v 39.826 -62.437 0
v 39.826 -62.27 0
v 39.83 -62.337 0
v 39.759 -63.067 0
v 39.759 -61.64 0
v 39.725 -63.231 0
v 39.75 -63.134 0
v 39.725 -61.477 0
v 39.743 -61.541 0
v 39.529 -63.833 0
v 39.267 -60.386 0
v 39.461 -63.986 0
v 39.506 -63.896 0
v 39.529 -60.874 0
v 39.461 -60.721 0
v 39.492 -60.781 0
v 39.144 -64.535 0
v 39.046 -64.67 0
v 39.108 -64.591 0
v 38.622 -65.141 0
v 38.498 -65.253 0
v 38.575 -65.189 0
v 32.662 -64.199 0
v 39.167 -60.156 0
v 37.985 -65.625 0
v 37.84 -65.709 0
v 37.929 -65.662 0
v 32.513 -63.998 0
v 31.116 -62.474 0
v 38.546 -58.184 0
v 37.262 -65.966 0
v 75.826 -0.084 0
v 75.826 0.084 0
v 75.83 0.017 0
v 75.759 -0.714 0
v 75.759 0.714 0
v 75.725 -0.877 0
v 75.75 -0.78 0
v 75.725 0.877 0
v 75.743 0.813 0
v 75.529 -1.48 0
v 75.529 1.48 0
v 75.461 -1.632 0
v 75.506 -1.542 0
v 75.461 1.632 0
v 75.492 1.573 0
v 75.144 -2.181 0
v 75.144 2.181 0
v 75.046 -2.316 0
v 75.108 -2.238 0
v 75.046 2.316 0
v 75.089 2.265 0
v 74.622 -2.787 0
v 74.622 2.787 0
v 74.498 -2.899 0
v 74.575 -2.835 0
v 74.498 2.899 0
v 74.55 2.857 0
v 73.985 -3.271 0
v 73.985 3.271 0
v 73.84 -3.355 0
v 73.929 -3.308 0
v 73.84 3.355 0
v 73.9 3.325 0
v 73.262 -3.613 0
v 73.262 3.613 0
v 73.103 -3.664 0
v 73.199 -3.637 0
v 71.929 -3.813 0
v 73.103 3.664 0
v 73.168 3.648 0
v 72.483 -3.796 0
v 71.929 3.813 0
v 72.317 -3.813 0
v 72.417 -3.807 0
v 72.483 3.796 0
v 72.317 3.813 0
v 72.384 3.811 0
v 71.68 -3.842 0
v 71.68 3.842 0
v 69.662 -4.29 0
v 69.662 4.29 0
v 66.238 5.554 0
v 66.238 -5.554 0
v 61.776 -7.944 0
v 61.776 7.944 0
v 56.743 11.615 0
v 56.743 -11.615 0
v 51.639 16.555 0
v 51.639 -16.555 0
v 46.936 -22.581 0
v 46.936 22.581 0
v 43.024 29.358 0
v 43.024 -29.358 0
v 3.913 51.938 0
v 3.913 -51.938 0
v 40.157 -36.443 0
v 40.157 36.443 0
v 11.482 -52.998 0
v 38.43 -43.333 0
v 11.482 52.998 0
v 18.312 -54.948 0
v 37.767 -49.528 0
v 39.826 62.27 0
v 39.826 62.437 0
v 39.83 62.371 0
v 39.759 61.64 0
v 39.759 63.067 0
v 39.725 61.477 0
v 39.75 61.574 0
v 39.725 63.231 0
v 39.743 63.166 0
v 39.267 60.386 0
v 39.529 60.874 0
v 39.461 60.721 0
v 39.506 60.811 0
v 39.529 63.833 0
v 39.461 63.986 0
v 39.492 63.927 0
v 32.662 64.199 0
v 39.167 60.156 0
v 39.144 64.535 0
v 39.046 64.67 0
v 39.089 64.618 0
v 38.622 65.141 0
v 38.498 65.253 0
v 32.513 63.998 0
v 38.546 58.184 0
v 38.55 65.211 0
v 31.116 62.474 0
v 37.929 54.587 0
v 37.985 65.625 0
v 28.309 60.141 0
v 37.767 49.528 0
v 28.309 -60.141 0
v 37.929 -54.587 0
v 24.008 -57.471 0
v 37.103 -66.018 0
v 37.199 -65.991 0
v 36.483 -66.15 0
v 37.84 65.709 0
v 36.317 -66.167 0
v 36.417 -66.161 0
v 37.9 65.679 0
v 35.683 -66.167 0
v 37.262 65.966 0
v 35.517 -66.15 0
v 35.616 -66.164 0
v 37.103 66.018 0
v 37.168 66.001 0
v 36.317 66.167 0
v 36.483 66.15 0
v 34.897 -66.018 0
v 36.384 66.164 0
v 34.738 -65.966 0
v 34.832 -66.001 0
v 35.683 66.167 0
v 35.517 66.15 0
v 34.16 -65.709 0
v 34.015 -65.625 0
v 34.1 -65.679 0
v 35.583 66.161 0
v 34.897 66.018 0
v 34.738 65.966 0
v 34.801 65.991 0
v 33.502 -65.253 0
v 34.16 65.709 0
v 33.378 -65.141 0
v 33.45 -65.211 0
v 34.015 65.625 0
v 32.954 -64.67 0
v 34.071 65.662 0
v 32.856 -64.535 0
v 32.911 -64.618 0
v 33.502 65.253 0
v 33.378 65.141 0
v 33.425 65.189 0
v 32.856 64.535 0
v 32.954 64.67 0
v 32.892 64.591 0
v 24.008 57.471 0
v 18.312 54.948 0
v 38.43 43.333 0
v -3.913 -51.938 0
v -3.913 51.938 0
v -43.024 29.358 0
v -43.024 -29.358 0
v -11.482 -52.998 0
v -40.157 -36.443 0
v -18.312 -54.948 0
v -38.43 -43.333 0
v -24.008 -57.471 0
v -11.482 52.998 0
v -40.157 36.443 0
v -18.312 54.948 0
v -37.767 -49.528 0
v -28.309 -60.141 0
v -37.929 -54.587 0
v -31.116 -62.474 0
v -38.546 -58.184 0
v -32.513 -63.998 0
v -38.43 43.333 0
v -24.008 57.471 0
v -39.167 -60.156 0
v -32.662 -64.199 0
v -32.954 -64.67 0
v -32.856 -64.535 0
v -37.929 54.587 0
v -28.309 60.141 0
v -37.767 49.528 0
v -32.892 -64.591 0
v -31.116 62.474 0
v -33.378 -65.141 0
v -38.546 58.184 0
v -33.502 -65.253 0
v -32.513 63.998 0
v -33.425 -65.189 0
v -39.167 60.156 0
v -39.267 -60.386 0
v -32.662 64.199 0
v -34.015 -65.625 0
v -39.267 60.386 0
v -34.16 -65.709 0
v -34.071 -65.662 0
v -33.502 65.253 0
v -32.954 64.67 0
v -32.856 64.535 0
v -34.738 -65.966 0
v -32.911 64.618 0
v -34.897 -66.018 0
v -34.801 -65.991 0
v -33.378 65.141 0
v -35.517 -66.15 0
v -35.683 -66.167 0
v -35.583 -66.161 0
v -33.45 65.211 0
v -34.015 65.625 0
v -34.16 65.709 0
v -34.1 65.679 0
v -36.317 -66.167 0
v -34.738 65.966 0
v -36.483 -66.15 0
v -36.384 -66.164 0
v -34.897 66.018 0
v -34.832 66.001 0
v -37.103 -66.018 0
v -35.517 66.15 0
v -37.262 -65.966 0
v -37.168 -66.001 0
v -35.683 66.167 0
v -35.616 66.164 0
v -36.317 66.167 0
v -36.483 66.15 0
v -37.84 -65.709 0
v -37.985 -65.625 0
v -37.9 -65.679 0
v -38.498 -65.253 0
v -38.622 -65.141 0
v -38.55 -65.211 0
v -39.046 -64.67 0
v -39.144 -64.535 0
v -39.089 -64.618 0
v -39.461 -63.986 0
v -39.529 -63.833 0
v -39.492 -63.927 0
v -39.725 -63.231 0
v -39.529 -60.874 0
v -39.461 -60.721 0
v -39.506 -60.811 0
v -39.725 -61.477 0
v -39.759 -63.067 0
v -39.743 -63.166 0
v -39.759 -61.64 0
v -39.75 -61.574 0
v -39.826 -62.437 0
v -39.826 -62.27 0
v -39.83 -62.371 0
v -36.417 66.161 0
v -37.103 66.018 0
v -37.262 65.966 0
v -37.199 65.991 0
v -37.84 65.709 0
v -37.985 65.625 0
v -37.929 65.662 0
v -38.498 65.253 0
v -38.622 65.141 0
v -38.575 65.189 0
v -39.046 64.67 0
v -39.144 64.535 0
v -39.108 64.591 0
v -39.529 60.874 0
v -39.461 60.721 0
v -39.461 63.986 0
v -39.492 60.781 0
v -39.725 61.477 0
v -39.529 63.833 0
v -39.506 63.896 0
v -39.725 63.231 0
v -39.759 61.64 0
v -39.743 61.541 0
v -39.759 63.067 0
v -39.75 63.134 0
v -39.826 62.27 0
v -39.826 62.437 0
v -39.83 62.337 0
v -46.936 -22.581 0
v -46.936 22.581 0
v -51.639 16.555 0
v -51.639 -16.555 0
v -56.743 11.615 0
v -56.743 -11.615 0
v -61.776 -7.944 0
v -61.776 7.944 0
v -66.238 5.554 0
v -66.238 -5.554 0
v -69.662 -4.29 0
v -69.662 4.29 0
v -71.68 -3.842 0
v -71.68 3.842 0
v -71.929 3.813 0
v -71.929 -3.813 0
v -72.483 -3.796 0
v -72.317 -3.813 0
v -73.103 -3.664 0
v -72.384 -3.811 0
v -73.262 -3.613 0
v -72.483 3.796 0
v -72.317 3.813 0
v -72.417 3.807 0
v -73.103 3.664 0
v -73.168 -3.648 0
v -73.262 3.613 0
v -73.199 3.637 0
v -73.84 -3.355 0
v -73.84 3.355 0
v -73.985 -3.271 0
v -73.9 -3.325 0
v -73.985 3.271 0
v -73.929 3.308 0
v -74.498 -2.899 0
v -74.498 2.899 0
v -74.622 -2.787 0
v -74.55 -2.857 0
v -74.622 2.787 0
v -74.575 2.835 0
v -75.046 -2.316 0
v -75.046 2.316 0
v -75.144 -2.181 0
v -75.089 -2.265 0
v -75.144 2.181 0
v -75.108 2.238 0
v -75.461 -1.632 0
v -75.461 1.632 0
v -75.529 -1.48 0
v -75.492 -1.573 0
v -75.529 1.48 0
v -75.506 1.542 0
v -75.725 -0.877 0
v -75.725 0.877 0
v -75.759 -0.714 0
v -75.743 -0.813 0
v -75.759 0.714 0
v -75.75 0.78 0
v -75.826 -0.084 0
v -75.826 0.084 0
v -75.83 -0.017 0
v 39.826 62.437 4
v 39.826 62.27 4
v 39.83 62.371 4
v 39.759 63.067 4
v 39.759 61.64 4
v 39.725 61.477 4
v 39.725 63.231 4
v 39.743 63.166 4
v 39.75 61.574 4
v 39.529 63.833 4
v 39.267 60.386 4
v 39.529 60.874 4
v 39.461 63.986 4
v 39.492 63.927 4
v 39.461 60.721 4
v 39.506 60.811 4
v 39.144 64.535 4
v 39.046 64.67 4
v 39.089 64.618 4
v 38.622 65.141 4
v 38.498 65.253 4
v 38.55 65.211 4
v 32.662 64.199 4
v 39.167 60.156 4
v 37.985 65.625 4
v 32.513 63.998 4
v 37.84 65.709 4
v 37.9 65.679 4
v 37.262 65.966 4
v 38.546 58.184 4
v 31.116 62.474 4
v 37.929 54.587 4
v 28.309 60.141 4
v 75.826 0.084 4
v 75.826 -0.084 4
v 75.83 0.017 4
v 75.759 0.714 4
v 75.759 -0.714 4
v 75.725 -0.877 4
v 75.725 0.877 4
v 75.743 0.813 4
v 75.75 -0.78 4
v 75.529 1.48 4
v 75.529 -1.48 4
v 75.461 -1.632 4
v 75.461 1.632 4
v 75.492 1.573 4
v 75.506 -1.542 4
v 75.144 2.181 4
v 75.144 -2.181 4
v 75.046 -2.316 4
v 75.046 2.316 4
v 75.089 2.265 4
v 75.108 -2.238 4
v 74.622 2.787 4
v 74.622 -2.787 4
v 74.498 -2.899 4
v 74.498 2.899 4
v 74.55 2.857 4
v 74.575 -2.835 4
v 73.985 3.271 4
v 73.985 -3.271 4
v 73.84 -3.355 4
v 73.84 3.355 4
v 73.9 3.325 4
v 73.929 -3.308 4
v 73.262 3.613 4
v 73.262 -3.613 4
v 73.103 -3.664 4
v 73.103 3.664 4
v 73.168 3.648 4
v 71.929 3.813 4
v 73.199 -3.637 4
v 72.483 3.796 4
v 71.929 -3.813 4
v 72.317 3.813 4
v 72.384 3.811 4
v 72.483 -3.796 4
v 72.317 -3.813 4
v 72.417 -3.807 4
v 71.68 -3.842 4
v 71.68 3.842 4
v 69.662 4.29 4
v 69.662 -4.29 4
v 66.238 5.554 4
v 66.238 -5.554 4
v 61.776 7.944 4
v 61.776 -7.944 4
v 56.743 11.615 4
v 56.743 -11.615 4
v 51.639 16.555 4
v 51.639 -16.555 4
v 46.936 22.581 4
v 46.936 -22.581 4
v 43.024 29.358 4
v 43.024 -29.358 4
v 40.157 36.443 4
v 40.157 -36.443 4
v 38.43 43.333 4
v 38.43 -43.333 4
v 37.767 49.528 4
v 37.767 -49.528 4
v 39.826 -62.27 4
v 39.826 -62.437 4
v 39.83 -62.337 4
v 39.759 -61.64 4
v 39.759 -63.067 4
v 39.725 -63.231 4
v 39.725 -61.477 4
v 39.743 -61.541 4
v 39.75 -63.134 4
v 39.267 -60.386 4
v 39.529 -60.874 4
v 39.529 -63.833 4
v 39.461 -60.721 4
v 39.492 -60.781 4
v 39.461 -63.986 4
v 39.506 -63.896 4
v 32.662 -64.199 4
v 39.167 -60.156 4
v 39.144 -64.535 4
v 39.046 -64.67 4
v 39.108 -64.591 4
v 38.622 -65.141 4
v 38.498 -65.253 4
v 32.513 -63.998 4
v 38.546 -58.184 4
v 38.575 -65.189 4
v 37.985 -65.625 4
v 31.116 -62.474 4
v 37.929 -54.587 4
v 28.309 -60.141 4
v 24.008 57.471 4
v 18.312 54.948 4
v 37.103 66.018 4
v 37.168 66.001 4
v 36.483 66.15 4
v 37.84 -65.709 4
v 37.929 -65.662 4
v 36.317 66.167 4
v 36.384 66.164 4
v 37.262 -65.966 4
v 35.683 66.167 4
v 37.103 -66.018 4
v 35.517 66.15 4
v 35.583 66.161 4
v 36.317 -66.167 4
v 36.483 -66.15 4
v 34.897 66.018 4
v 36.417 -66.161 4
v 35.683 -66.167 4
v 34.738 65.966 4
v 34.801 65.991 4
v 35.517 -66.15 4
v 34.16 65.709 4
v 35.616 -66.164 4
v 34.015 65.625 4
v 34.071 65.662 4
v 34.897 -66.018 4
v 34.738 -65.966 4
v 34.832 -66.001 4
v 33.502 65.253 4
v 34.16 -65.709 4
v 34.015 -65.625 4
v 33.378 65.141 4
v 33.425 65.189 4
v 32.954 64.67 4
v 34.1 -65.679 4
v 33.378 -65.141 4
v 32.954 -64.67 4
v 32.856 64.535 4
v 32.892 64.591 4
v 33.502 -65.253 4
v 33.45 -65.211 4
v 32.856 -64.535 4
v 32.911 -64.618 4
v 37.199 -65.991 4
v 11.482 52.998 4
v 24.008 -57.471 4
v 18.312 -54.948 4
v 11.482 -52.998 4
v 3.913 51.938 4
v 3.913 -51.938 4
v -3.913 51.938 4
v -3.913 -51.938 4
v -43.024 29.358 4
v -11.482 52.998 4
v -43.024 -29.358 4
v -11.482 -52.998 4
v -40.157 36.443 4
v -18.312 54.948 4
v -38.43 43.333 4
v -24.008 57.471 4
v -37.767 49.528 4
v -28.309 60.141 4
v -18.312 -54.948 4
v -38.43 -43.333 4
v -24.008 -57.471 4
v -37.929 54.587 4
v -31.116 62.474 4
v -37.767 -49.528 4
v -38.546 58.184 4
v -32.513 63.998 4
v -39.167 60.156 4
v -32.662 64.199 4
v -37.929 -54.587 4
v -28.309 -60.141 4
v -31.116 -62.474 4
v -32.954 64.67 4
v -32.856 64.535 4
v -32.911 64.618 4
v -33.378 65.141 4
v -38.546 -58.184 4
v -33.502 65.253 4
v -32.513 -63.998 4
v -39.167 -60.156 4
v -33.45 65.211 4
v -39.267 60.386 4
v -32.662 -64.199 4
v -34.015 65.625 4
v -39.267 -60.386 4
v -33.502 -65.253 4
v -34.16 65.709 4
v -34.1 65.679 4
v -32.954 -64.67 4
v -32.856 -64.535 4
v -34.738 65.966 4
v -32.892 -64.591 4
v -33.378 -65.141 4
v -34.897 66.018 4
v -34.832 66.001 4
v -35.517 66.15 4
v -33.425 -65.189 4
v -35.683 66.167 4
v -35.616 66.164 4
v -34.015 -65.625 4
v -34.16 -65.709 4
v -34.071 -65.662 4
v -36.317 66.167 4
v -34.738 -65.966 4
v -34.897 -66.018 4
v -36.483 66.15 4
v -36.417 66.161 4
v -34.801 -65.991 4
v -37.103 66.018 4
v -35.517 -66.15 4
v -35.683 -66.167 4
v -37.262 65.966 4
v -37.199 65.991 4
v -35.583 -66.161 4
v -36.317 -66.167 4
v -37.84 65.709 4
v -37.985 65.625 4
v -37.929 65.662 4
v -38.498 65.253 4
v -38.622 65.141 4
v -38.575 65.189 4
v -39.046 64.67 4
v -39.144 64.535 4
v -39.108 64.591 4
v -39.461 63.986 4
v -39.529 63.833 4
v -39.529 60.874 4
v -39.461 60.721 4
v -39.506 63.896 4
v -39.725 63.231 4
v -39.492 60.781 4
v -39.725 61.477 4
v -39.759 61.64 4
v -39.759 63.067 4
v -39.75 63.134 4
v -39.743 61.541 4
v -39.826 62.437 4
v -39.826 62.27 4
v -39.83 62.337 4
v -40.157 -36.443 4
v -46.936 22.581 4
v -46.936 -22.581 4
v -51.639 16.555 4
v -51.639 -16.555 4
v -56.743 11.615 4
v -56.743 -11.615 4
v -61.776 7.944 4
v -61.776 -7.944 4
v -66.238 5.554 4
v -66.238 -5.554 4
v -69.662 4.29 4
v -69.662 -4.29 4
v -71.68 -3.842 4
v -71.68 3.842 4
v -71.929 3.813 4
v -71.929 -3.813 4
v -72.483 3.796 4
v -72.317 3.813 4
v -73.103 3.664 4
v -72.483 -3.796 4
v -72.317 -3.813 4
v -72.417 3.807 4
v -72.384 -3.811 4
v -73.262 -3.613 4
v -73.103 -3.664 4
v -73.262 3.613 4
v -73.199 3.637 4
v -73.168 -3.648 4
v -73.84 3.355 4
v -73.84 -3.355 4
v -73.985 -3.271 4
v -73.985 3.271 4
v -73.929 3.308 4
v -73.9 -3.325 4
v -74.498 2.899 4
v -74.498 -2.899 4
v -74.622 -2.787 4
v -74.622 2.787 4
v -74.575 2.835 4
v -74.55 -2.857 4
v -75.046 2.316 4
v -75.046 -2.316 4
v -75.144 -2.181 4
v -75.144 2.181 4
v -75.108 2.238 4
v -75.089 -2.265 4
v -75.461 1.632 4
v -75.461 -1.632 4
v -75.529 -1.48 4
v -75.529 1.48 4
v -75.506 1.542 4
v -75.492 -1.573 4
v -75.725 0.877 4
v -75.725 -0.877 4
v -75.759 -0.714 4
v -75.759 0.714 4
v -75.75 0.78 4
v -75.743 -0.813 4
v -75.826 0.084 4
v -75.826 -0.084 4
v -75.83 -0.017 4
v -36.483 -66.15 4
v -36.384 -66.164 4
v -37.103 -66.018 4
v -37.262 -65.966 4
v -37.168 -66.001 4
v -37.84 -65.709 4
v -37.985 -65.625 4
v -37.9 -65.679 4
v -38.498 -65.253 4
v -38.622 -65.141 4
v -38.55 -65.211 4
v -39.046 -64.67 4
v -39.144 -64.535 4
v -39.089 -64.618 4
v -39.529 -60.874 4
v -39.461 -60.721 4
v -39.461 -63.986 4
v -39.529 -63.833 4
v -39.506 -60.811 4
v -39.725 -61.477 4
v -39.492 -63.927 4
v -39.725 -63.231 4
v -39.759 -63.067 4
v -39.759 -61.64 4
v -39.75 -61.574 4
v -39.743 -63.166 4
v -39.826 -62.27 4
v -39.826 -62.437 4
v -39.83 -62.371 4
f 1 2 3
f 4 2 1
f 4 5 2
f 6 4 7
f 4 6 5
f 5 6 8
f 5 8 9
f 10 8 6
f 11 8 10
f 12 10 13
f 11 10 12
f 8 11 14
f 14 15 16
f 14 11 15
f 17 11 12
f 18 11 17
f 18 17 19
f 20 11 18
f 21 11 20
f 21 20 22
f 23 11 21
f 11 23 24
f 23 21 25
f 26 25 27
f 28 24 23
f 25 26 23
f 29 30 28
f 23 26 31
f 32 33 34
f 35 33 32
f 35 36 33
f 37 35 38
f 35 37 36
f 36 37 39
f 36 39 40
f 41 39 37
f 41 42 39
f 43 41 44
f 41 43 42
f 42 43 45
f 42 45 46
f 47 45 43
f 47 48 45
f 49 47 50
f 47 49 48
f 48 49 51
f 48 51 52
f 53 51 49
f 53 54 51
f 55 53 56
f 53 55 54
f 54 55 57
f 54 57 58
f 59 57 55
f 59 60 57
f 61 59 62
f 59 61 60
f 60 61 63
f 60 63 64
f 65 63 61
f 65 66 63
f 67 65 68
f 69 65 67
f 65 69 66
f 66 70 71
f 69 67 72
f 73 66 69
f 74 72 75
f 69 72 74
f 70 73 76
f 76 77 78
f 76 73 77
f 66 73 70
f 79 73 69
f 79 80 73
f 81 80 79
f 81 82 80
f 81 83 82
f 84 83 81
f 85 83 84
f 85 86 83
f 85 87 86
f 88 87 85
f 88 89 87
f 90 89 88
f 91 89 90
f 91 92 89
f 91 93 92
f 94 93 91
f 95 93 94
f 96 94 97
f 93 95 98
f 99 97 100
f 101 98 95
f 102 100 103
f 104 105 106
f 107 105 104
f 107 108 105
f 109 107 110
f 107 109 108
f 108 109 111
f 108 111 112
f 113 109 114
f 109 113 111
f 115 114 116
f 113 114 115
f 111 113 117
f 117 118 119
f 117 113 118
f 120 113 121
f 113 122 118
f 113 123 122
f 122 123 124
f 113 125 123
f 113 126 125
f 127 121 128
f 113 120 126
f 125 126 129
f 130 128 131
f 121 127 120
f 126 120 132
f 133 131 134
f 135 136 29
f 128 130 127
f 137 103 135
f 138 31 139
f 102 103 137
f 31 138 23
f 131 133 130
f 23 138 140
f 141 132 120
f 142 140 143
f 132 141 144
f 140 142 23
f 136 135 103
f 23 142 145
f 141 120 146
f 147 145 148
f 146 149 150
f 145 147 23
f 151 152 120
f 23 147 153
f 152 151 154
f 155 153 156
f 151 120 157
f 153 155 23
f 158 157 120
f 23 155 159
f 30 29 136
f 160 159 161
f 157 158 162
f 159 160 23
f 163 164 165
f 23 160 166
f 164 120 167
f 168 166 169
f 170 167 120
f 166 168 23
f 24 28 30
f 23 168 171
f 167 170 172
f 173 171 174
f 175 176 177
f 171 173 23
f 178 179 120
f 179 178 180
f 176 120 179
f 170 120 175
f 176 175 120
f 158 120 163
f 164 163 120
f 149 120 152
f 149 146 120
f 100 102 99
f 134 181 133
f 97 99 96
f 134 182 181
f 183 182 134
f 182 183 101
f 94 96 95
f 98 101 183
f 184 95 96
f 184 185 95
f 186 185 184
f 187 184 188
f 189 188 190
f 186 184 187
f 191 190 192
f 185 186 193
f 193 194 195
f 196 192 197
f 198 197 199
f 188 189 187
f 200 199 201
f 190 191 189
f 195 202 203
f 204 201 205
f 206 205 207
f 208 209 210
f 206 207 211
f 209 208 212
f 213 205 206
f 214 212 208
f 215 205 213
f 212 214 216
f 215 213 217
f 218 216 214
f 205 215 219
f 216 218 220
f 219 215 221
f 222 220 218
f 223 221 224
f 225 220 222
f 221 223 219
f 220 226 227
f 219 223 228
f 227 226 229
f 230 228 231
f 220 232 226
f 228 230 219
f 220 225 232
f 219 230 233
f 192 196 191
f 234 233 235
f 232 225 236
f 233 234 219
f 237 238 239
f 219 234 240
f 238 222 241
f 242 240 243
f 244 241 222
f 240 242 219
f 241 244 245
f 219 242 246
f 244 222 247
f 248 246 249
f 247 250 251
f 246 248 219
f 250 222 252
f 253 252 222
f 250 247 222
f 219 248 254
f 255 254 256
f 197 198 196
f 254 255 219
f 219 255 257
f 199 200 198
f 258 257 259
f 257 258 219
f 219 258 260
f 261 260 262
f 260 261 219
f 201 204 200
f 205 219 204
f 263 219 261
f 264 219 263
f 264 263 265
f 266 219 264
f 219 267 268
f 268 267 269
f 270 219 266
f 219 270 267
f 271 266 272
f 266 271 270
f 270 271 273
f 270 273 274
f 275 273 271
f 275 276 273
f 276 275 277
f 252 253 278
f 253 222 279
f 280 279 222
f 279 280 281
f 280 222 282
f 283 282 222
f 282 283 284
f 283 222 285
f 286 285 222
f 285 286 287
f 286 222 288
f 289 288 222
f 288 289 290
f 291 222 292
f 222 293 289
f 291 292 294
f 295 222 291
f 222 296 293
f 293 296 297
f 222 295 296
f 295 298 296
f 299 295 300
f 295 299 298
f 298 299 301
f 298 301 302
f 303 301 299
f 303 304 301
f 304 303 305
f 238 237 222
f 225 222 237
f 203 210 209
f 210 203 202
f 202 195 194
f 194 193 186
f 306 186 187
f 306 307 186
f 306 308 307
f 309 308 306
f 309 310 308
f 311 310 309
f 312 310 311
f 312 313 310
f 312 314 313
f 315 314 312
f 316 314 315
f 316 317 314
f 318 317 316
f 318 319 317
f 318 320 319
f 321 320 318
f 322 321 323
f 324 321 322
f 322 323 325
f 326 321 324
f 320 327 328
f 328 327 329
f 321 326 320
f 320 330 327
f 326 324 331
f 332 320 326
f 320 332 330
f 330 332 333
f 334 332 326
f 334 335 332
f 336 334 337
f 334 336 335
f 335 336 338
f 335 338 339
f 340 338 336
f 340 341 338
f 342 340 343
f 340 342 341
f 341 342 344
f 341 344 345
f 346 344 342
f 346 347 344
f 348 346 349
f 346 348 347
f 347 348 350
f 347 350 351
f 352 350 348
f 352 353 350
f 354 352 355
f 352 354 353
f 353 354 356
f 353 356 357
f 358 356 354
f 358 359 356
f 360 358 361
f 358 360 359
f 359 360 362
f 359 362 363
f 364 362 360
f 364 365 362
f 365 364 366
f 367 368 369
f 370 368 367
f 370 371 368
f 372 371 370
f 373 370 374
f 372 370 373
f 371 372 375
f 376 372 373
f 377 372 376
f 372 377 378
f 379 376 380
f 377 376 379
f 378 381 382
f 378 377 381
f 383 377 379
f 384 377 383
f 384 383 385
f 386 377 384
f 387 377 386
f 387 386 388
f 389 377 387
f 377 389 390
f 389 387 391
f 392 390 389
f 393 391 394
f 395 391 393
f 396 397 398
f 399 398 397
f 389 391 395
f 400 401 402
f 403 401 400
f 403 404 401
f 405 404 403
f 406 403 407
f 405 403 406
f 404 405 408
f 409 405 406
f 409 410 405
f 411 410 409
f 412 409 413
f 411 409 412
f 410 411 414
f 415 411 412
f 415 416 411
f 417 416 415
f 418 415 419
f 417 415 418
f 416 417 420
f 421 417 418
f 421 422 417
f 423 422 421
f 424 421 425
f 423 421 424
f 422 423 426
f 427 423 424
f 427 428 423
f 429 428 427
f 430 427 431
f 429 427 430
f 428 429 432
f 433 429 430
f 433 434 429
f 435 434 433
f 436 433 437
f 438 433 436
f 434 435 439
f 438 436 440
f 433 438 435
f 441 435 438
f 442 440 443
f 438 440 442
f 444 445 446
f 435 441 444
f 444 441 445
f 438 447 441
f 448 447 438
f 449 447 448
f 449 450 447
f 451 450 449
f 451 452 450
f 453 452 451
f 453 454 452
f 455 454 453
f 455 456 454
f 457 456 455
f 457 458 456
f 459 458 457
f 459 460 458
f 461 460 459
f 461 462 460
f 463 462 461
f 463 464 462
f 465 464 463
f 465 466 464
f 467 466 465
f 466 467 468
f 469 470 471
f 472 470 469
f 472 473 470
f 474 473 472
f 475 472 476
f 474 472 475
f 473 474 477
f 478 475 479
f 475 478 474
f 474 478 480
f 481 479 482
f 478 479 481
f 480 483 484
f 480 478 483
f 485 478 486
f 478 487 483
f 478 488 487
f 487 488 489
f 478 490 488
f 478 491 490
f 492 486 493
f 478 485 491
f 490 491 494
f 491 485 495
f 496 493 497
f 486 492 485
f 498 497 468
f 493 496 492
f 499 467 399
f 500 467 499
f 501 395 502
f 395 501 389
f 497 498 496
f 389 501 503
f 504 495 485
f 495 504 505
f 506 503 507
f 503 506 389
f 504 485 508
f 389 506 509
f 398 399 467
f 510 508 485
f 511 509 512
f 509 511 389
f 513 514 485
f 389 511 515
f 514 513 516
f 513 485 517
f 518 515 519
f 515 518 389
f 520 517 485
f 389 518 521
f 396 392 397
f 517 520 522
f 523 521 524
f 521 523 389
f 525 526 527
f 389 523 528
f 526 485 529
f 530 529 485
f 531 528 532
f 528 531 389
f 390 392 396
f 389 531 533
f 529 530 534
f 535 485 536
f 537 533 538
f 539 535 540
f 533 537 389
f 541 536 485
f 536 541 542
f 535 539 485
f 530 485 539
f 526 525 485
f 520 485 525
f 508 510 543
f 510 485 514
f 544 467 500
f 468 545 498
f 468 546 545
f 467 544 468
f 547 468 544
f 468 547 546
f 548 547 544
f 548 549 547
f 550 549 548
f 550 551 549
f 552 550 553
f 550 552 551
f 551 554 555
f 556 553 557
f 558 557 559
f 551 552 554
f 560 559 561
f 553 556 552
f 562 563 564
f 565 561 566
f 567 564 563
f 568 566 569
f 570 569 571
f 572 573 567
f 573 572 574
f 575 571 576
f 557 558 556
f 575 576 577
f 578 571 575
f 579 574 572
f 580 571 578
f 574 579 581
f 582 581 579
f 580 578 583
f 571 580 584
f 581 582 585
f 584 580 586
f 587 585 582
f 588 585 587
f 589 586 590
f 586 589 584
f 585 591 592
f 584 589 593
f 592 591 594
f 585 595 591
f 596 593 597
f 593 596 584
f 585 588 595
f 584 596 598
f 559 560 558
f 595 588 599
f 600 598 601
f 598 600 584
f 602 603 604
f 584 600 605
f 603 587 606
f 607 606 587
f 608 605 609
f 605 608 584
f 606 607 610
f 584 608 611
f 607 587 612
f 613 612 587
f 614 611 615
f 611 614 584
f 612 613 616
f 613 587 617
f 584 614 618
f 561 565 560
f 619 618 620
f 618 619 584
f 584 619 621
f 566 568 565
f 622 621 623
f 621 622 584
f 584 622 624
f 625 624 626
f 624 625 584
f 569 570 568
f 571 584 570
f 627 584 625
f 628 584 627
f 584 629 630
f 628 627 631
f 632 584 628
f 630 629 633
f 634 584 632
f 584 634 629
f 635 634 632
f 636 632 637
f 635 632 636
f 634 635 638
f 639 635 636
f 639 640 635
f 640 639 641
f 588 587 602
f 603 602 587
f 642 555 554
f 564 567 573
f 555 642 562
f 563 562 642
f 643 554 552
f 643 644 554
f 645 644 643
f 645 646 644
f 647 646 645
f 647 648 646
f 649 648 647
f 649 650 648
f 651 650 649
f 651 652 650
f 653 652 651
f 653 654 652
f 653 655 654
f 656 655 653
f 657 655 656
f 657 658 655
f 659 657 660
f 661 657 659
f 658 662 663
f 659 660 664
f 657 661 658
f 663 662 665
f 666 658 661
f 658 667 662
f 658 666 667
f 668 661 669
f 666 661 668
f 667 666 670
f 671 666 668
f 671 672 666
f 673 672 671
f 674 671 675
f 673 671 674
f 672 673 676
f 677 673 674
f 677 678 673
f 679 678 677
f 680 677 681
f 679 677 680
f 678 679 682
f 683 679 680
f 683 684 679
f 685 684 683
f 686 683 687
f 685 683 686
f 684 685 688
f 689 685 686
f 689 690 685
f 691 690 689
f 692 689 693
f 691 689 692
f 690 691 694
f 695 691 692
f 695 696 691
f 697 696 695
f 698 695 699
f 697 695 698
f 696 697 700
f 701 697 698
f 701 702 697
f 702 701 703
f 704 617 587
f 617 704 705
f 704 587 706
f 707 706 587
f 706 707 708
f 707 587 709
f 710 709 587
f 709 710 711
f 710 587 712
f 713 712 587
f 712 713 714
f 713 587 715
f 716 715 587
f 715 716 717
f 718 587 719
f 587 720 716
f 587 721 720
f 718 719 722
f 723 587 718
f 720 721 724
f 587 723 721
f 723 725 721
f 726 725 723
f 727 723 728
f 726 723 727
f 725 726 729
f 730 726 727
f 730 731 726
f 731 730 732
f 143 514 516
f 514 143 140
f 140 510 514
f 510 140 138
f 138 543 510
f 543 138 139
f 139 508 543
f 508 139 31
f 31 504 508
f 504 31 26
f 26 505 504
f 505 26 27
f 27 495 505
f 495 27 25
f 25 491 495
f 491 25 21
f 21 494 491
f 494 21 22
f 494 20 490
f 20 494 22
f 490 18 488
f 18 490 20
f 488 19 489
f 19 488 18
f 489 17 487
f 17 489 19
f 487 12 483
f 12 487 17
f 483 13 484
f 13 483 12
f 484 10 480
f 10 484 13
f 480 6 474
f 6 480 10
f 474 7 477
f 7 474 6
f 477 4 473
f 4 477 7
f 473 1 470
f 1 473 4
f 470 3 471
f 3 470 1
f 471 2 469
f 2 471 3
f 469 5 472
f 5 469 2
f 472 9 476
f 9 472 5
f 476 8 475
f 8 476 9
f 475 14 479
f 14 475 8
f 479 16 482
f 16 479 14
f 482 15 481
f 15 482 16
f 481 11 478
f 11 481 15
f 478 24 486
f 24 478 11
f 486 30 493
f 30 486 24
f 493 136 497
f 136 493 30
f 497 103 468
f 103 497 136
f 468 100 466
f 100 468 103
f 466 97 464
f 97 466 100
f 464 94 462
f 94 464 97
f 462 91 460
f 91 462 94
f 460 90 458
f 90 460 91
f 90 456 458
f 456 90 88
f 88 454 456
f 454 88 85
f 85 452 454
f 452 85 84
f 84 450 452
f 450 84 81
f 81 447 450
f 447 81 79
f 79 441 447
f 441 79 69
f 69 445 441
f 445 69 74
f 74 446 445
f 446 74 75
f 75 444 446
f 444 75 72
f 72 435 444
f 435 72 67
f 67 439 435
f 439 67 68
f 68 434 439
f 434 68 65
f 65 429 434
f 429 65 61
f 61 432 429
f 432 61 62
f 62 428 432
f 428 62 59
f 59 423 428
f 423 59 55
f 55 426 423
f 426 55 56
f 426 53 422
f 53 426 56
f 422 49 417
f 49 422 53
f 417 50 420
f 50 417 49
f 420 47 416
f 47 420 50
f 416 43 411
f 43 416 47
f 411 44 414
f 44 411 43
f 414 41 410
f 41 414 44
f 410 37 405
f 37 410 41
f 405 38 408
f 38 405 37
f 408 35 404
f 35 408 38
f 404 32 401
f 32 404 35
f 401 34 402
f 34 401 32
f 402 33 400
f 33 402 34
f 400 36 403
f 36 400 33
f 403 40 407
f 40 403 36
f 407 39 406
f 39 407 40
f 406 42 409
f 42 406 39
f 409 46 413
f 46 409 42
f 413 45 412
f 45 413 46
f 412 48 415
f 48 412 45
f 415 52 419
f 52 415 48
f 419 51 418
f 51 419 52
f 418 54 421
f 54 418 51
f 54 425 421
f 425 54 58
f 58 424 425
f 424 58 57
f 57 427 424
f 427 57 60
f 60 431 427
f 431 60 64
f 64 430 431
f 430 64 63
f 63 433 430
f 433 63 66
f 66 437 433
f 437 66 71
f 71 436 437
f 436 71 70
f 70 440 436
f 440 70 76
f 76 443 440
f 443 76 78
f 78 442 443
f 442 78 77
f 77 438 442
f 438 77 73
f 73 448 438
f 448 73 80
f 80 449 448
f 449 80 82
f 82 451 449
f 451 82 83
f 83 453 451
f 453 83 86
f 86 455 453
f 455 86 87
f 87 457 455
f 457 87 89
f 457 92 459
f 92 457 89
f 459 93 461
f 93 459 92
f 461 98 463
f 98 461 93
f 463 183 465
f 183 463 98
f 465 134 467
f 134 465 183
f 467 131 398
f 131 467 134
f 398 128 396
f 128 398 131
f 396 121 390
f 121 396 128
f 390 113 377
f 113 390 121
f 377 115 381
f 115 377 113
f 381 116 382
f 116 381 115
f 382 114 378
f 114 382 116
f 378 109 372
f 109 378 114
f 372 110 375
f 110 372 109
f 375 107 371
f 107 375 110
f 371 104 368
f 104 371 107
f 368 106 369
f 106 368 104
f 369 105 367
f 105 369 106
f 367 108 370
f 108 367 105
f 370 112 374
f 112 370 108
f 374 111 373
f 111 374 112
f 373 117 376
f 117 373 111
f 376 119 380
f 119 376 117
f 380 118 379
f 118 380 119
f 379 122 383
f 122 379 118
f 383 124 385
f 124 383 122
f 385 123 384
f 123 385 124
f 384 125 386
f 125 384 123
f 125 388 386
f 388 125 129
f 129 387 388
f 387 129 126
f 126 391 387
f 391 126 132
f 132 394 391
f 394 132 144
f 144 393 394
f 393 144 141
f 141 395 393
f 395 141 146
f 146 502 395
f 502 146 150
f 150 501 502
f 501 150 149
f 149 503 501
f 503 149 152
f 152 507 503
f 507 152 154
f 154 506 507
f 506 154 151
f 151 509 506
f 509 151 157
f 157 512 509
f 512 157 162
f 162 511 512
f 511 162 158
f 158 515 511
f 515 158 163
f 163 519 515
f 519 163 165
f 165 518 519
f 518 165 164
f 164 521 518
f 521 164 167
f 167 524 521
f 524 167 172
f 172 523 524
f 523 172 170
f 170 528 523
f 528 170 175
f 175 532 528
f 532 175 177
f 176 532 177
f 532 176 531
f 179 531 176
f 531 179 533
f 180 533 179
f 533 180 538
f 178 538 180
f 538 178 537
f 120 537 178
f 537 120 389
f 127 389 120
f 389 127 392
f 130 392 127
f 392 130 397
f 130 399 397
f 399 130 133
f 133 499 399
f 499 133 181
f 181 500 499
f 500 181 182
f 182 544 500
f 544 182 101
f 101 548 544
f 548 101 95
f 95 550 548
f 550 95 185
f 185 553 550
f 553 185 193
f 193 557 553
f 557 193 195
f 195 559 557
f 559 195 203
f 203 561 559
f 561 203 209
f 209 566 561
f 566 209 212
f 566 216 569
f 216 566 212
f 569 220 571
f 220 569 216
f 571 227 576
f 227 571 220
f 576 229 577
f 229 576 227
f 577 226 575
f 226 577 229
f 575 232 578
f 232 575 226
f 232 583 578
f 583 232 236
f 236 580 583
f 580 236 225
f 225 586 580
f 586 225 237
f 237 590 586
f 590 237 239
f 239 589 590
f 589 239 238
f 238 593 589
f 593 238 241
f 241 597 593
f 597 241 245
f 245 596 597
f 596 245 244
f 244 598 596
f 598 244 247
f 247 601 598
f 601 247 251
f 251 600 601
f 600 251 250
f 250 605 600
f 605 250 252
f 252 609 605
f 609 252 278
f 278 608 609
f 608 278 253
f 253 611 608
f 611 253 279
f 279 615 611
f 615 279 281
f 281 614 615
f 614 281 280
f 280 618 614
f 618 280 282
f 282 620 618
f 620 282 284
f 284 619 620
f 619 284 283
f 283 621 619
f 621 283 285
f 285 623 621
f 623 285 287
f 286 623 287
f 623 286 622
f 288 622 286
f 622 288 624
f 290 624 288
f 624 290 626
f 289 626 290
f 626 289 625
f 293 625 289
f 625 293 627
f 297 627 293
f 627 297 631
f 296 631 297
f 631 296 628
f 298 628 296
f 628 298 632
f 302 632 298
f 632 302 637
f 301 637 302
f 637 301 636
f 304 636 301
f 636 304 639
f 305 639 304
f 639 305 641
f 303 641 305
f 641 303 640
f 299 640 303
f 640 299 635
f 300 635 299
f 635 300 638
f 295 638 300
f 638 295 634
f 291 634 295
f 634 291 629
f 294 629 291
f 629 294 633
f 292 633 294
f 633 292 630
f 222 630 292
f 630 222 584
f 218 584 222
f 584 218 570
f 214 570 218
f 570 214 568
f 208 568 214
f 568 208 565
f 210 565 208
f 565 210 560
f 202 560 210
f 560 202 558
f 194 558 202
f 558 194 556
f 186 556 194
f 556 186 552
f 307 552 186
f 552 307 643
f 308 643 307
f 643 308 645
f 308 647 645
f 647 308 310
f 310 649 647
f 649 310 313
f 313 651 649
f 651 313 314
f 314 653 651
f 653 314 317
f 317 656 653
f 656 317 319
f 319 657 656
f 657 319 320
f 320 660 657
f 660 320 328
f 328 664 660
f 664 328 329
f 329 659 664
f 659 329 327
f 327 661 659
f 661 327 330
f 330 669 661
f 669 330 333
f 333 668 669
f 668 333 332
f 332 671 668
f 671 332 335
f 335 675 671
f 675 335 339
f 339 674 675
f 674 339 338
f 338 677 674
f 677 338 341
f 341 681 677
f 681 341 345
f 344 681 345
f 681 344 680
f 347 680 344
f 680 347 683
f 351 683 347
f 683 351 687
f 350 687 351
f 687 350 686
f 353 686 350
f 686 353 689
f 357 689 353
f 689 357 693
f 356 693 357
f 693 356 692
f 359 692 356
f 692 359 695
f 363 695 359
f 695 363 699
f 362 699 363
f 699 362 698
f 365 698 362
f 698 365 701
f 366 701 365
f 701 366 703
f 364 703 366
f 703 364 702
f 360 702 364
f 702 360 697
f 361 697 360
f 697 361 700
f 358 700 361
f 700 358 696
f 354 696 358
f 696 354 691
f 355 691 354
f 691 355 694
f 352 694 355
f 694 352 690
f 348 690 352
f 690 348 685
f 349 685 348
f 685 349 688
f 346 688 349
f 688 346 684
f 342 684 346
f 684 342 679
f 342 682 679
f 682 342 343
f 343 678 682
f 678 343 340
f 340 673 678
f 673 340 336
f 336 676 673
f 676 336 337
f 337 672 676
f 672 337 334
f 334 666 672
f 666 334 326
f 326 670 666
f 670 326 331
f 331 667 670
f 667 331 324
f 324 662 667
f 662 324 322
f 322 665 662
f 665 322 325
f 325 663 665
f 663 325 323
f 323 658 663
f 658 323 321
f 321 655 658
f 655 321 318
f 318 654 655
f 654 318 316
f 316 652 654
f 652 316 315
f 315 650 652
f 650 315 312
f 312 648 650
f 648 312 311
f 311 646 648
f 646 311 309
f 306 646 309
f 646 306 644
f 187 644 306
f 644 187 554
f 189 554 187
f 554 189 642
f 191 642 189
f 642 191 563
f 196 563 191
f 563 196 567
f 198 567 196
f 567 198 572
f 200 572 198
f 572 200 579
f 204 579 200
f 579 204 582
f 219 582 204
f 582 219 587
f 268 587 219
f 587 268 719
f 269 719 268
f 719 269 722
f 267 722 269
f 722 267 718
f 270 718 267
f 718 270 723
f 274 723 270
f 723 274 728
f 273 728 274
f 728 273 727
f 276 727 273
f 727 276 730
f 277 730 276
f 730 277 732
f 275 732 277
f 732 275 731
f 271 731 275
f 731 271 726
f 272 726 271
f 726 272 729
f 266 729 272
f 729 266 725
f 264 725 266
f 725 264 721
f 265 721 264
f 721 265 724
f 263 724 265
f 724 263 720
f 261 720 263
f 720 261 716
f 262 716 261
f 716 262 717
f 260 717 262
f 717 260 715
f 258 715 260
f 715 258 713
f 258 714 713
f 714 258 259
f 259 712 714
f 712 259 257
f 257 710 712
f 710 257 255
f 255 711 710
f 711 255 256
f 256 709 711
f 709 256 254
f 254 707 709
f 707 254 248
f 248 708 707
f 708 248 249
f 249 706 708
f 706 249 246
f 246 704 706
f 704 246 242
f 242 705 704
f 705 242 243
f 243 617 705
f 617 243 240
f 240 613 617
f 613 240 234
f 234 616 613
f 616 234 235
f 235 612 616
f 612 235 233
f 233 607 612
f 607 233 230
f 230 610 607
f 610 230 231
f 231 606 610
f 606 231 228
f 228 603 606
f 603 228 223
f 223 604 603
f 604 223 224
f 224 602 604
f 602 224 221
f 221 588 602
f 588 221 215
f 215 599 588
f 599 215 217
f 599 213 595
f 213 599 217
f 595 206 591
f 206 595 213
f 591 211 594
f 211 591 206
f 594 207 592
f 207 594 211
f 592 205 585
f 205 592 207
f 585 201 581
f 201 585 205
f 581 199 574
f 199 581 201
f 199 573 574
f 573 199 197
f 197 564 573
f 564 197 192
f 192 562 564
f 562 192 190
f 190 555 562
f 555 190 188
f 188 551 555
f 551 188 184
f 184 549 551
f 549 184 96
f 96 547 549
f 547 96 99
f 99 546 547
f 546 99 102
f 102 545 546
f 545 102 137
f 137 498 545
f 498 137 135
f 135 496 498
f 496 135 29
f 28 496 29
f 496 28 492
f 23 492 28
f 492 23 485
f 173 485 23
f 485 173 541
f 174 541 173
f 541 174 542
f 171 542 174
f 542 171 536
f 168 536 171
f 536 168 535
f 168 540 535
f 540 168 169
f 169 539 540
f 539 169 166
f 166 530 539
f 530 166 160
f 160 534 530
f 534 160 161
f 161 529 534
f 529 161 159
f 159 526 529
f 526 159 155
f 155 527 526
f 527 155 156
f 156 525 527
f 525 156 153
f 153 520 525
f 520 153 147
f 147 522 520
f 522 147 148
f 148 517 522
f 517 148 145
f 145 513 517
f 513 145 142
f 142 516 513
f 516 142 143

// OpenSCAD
// file: ../../../../reference/oomlout_opsc_version_3/cycloid.scad
$fn = 30;


//source https://www.thingiverse.com/thing:8348

lobe_number = 30;
radius_offset = 1.5;
radius_pin = 6/2;

cycloid(lobe_number, radius_offset, radius_pin);


module cycloid (lobe_number, radius_offset, radius_pin){
	//hypotrochoidBandFast(n, r, thickness, r_off)
	hypotrochoidBandFast(lobe_number, radius_offset, 6, radius_pin);
}


module hypotrochoidBandFast(n, r, thickness, r_off) {
    
    pi = 3.14159265;

	R = r*n;
	d = r;

	// set to 1 for normal size cylinders.  this will leave a tiny cusp in some cases that does
	// not blend in to cylinders.  see below for details.  make hideCuspFactor larger to scale up
	// the cylinders slightly. 1.01 seems to work OK.
	hideCuspFactor = 1.01;

	// dth stands for dtheta - i.e. a small change of the angle "theta"
	// there are 14 intermediate points on the curve, so a wedge is
	// divided into 14 + 1 = 15.  You may be tempted to change this, but it really is 15.
	dth = 360/n/15;

	// X points on base hypotrochoid
	xbStart = (R-r) + d;
	xbEnd =  (R-r)*cos(360/n) + d*cos((R-r)/r*360/n);	

	// Instead of an array and a for-loop we just hard-code these 
	// intermediate points, this if for X coords on the base hypocycloid.
	//
	xb1 = (R-r)*cos(dth*1) + d*cos((R-r)/r*dth*1);
	xb2 = (R-r)*cos(dth*2) + d*cos((R-r)/r*dth*2);
	xb3 = (R-r)*cos(dth*3) + d*cos((R-r)/r*dth*3);
	xb4 = (R-r)*cos(dth*4) + d*cos((R-r)/r*dth*4);
	xb5 = (R-r)*cos(dth*5) + d*cos((R-r)/r*dth*5);
	xb6 = (R-r)*cos(dth*6) + d*cos((R-r)/r*dth*6);
	xb7 = (R-r)*cos(dth*7) + d*cos((R-r)/r*dth*7);	
	xb8 = (R-r)*cos(dth*8) + d*cos((R-r)/r*dth*8);
	xb9 = (R-r)*cos(dth*9) + d*cos((R-r)/r*dth*9);
	xb10 = (R-r)*cos(dth*10) + d*cos((R-r)/r*dth*10);
	xb11 = (R-r)*cos(dth*11) + d*cos((R-r)/r*dth*11);
	xb12 = (R-r)*cos(dth*12) + d*cos((R-r)/r*dth*12);
	xb13 = (R-r)*cos(dth*13) + d*cos((R-r)/r*dth*13);
	xb14 = (R-r)*cos(dth*14) + d*cos((R-r)/r*dth*14);	

	// Y points on base hypotrochoid
	ybStart = 0;
	ybEnd =   (R-r)*sin(360/n) - d*sin((R-r)/r*360/n);

	// Instead of an array and a for-loop we just hard-code these 
	// intermediate points, this if for Y coords on the base hypocycloid.
	//
	yb1 =  (R-r)*sin(dth*1) - d*sin((R-r)/r*dth*1);
	yb2 =  (R-r)*sin(dth*2) - d*sin((R-r)/r*dth*2);
	yb3 =  (R-r)*sin(dth*3) - d*sin((R-r)/r*dth*3);
	yb4 =  (R-r)*sin(dth*4) - d*sin((R-r)/r*dth*4);
	yb5 =  (R-r)*sin(dth*5) - d*sin((R-r)/r*dth*5);
	yb6 =  (R-r)*sin(dth*6) - d*sin((R-r)/r*dth*6);
	yb7 =  (R-r)*sin(dth*7) - d*sin((R-r)/r*dth*7);
	yb8 =  (R-r)*sin(dth*8) - d*sin((R-r)/r*dth*8);
	yb9 =  (R-r)*sin(dth*9) - d*sin((R-r)/r*dth*9);
	yb10 =  (R-r)*sin(dth*10) - d*sin((R-r)/r*dth*10);
	yb11 =  (R-r)*sin(dth*11) - d*sin((R-r)/r*dth*11);
	yb12 =  (R-r)*sin(dth*12) - d*sin((R-r)/r*dth*12);
	yb13 =  (R-r)*sin(dth*13) - d*sin((R-r)/r*dth*13);
	yb14 =  (R-r)*sin(dth*14) - d*sin((R-r)/r*dth*14);

	// Now we do the offset points.  The tangent to the
	// hypotrochoid is [dx/dtheta, dy/dtheta].
	// We take the tangent, normalize it, rotate it, and scale it 
	// to get the offsets in X and Y coords.
	
	// X offset points
	xfStart = 0;
	xfEnd =  r_off*cos(360/n - 90);

	// hard-coded offset points for X
	//
	xf1 = (R-r)*cos(dth*1) - r*cos( (R-r)/r*dth*1) * (R-r)/r ;
	xf2 = (R-r)*cos(dth*2) - r*cos( (R-r)/r*dth*2) * (R-r)/r ;
	xf3 = (R-r)*cos(dth*3) - r*cos( (R-r)/r*dth*3) * (R-r)/r ;
	xf4 = (R-r)*cos(dth*4) - r*cos( (R-r)/r*dth*4) * (R-r)/r ;
	xf5 = (R-r)*cos(dth*5) - r*cos( (R-r)/r*dth*5) * (R-r)/r ;
	xf6 = (R-r)*cos(dth*6) - r*cos( (R-r)/r*dth*6) * (R-r)/r ;
	xf7 = (R-r)*cos(dth*7) - r*cos( (R-r)/r*dth*7) * (R-r)/r ;	
	xf8 = (R-r)*cos(dth*8) - r*cos( (R-r)/r*dth*8) * (R-r)/r ;
	xf9 = (R-r)*cos(dth*9) - r*cos( (R-r)/r*dth*9) * (R-r)/r ;
	xf10 = (R-r)*cos(dth*10) - r*cos( (R-r)/r*dth*10) * (R-r)/r ;
	xf11 = (R-r)*cos(dth*11) - r*cos( (R-r)/r*dth*11) * (R-r)/r ;
	xf12 = (R-r)*cos(dth*12) - r*cos( (R-r)/r*dth*12) * (R-r)/r ;
	xf13 = (R-r)*cos(dth*13) - r*cos( (R-r)/r*dth*13) * (R-r)/r ;
	xf14 = (R-r)*cos(dth*14) - r*cos( (R-r)/r*dth*14) * (R-r)/r ;	

	// Y offset points
	yfStart = r_off;
	yfEnd =  r_off*sin(360/n - 90);

	yf1 =  (R-r)*sin(dth*1) + r*sin( (R-r)/r*dth*1) * (R-r)/r ;
	yf2 =  (R-r)*sin(dth*2) + r*sin( (R-r)/r*dth*2) * (R-r)/r ;
	yf3 =  (R-r)*sin(dth*3) + r*sin( (R-r)/r*dth*3) * (R-r)/r ;
	yf4 =  (R-r)*sin(dth*4) + r*sin( (R-r)/r*dth*4) * (R-r)/r ;
	yf5 =  (R-r)*sin(dth*5) + r*sin( (R-r)/r*dth*5) * (R-r)/r ;
	yf6 =  (R-r)*sin(dth*6) + r*sin( (R-r)/r*dth*6) * (R-r)/r ;
	yf7 =  (R-r)*sin(dth*7) + r*sin( (R-r)/r*dth*7) * (R-r)/r ;
	yf8 =  (R-r)*sin(dth*8) + r*sin( (R-r)/r*dth*8) * (R-r)/r ;
	yf9 =  (R-r)*sin(dth*9) + r*sin( (R-r)/r*dth*9) * (R-r)/r ;
	yf10 =  (R-r)*sin(dth*10) + r*sin( (R-r)/r*dth*10) * (R-r)/r ;
	yf11 =  (R-r)*sin(dth*11) + r*sin( (R-r)/r*dth*11) * (R-r)/r ;
	yf12 =  (R-r)*sin(dth*12) + r*sin( (R-r)/r*dth*12) * (R-r)/r ;
	yf13 =  (R-r)*sin(dth*13) + r*sin( (R-r)/r*dth*13) * (R-r)/r ;
	yf14 =  (R-r)*sin(dth*14) + r*sin( (R-r)/r*dth*14) * (R-r)/r ;

	m1 = sqrt(xf1*xf1 + yf1*yf1)/r_off;
	m2 = sqrt(xf2*xf2 + yf2*yf2)/r_off;
	m3 = sqrt(xf3*xf3 + yf3*yf3)/r_off;
	m4 = sqrt(xf4*xf4 + yf4*yf4)/r_off;
	m5 = sqrt(xf5*xf5 + yf5*yf5)/r_off;
	m6 = sqrt(xf6*xf6 + yf6*yf6)/r_off;
	m7 = sqrt(xf7*xf7 + yf7*yf7)/r_off;
	m8 = sqrt(xf8*xf8 + yf8*yf8)/r_off;
	m9 = sqrt(xf9*xf9 + yf9*yf9)/r_off;
	m10 = sqrt(xf10*xf10 + yf10*yf10)/r_off;
	m11 = sqrt(xf11*xf11 + yf11*yf11)/r_off;
	m12 = sqrt(xf12*xf12 + yf12*yf12)/r_off;
	m13 = sqrt(xf13*xf13 + yf13*yf13)/r_off;
	m14 = sqrt(xf14*xf14 + yf14*yf14)/r_off;

// Now that we have the points, we make a polygon and extrude it.
    union(){}
		for  ( i = [0:n-1] ) {
			rotate([0,0, 360/n*i]) {

					// the first point in the polygon is moved slightly off the origin
					polygon(points= [
						[-R/20 * cos(360/n/2) , -R/20 * sin(360/n/2)],
						[xbStart, ybStart],
						[xbStart + xfStart, ybStart + yfStart], 

						[xb1 + xf1/m1, yb1 + yf1/m1], 
						[xb2 + xf2/m2, yb2 + yf2/m2], 
						[xb3 + xf3/m3, yb3 + yf3/m3], 
						[xb4 + xf4/m4, yb4 + yf4/m4], 
						[xb5 + xf5/m5, yb5 + yf5/m5], 
						[xb6 + xf6/m6, yb6 + yf6/m6], 
						[xb7 + xf7/m7, yb7 + yf7/m7], 
						[xb8 + xf8/m8, yb8 + yf8/m8], 
						[xb9 + xf9/m9, yb9 + yf9/m9], 
						[xb10 + xf10/m10, yb10 + yf10/m10], 
						[xb11 + xf11/m11, yb11 + yf11/m11], 
						[xb12 + xf12/m12, yb12 + yf12/m12], 
						[xb13 + xf13/m13, yb13 + yf13/m13], 
						[xb14 + xf14/m14, yb14 + yf14/m14], 

						[xbEnd + xfEnd, ybEnd + yfEnd],
						[xbEnd, ybEnd]],
						paths = [[0,19,18,17,16,15,14,13,12,11,10,9,8,7,6,5,4,3,2,1]],
						convexity = 10);

			// If you look at just the wedge extruded above, without the cylinders below,
			// you can see a small cusp as the band radius gets larger.  The radius of 
			// the cylinder is manually increased a slight bit so that the cusp is contained 
			// within the cylinder.  With unlimited resolution, the cusp and cylinder would
			// blend together perfectly (I think), but this workaround is needed because
			// we are only using piecewise linear approximations to these curves.
			
			translate([xbStart, ybStart, 0])
				//cylinder(r = hideCuspFactor*r_off, h = thickness, center = true);
				circle(r = hideCuspFactor*r_off);
        
	    } //end rotate

    } //end for




} // end module hypotrochoidBandFast
//=========================================== 
// main file
$fn = 50;

use <../../../../reference/oomlout_opsc_version_3/cycloid.scad>;

difference() {
	union() {
		linear_extrude(height = 4) {
			offset(r = 0.8) {
				cycloid(lobe_number = 6, radius_offset = 12, radius_pin = 3);
			}
		}
	}
	union();
}
